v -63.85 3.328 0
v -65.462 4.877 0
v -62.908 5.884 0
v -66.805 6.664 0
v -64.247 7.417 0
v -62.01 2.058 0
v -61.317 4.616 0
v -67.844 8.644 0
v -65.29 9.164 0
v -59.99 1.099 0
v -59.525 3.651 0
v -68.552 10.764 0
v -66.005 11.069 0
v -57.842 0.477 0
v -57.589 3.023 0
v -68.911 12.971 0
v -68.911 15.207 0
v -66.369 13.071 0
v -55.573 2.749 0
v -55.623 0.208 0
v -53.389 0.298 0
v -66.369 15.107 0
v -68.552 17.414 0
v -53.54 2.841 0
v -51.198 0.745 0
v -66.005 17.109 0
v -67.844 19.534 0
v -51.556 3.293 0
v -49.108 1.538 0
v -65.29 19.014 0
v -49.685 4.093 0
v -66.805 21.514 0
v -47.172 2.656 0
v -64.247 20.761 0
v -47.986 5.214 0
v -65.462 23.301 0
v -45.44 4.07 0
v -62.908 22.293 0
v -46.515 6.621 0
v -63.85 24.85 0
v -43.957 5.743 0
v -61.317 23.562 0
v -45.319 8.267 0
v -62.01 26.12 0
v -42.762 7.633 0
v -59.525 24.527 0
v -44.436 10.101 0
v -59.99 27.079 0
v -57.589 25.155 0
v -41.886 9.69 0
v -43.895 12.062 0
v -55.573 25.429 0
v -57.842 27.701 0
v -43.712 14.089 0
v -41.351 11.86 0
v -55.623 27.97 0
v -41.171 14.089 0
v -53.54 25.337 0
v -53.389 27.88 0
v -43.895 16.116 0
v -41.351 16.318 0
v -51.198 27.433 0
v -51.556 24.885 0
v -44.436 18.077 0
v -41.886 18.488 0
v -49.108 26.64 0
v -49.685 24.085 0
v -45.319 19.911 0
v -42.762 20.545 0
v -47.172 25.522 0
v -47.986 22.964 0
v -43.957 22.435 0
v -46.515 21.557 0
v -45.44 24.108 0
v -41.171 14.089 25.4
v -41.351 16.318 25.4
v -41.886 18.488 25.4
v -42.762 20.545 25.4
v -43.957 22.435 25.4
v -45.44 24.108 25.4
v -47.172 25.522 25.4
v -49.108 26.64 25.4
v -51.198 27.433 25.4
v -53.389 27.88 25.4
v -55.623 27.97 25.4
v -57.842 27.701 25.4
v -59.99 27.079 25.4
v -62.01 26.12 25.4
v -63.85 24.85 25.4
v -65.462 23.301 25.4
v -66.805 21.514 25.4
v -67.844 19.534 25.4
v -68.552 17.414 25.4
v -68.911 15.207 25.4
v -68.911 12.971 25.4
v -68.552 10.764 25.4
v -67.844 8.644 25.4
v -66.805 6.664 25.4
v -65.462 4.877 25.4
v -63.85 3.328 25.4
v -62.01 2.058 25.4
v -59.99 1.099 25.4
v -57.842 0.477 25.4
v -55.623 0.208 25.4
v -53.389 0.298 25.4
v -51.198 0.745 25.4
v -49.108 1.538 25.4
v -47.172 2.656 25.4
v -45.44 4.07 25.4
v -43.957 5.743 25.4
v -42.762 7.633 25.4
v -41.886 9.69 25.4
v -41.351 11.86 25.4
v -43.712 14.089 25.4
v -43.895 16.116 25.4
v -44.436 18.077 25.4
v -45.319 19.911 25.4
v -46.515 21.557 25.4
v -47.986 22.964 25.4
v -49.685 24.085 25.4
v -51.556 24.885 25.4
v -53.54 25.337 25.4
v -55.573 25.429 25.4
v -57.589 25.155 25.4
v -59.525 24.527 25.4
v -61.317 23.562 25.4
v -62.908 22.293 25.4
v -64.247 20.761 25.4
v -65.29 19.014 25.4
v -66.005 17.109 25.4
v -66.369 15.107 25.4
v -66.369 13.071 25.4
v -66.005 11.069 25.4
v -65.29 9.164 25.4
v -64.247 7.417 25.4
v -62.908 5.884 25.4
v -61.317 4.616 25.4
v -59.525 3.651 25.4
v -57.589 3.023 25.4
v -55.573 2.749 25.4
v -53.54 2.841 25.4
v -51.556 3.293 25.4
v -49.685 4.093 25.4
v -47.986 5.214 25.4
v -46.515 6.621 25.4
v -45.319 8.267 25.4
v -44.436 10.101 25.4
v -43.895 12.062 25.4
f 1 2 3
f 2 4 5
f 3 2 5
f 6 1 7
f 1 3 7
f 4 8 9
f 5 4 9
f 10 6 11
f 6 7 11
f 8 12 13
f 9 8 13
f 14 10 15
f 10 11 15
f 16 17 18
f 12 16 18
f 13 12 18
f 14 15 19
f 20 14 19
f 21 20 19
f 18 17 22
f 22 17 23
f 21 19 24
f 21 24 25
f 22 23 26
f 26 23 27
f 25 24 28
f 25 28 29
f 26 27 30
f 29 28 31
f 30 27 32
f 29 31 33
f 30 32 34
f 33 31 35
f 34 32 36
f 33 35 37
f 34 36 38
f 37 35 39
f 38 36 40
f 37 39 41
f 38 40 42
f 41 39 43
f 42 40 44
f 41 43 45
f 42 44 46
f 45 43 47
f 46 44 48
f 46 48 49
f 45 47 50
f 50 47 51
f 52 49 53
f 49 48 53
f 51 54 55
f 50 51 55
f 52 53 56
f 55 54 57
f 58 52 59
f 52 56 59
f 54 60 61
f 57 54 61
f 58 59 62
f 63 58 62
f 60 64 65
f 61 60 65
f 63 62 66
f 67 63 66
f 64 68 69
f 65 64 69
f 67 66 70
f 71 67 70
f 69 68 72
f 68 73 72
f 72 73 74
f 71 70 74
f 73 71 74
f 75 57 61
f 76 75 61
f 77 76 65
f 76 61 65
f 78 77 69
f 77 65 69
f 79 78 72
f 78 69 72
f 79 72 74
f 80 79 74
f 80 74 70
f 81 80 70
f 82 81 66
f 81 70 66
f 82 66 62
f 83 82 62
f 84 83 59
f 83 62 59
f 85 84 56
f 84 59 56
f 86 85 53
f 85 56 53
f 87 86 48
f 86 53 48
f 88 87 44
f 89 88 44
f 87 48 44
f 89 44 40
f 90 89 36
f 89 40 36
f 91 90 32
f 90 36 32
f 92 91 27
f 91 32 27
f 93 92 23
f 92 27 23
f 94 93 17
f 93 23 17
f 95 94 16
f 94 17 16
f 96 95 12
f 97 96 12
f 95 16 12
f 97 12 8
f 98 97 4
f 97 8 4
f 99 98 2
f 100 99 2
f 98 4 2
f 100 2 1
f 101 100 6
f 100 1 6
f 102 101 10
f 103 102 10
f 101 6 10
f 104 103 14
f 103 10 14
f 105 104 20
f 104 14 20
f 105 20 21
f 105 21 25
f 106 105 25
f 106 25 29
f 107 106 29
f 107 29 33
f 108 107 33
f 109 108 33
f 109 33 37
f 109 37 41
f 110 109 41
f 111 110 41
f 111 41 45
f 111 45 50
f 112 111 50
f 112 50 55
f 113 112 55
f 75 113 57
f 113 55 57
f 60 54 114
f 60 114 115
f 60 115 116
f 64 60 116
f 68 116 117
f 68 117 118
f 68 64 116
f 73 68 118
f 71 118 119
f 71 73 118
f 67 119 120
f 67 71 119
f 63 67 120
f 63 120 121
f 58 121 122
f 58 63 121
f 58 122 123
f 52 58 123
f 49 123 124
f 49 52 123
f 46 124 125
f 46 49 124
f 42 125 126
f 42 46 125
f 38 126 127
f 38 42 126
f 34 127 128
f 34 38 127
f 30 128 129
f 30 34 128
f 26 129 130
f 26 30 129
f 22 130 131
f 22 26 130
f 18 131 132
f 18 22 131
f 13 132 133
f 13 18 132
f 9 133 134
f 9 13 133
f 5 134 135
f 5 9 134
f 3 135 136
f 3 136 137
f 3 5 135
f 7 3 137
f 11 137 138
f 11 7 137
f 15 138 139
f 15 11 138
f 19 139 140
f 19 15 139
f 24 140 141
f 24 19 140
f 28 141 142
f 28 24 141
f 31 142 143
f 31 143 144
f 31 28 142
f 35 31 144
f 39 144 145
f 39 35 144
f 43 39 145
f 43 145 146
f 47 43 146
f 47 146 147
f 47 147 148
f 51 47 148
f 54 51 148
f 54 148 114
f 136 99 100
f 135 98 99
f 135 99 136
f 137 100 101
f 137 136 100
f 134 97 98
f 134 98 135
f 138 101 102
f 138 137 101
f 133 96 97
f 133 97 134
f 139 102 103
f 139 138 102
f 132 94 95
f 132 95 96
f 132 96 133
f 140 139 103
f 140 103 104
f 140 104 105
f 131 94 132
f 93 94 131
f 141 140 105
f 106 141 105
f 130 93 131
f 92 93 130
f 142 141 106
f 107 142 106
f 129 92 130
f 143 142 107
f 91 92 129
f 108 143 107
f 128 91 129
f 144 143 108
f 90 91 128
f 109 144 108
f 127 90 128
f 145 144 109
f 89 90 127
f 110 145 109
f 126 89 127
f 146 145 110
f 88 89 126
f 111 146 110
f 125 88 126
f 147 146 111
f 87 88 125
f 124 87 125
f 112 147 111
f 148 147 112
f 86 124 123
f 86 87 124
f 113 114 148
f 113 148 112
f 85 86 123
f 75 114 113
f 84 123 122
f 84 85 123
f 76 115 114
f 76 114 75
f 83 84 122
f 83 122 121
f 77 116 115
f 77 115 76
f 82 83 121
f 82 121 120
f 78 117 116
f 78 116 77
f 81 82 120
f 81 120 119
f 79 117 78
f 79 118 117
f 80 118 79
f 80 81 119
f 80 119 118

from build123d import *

# Parameters (mm, degrees)
F3_R     = 11.3510766414
F4_DEPTH = 25.4
F0_R     = 13.8925555002
F0_R_2   = 11.3510766414
F5_R     = 11.3510766414
F6_DEPTH = 25.401


with BuildPart() as f4:
    # F3 (on face) → F4 (new body)
    with BuildSketch(Plane.XY):
        with Locations((-55.0634227693, 14.0889985487)):
            Circle(F3_R)
    extrude(amount=F4_DEPTH)

    # F5 (on face) → F6 (cut, through all)
    with BuildSketch(Plane.XY.offset(25.4)):
        with Locations((-55.0634227693, 14.0889985487)):
            Circle(F5_R)
    extrude(amount=-F6_DEPTH, mode=Mode.SUBTRACT)


with BuildPart() as f4b:
    # F0 (on Top) → F4, piece 2 (new body)
    with BuildSketch(Plane.XY):
        with Locations((-55.0634227693, 14.0889985487)):
            Circle(F0_R)
        with Locations((-55.0634227693, 14.0889985487)):
            Circle(F0_R_2, mode=Mode.SUBTRACT)
    extrude(amount=F4_DEPTH)


solid = f4b.part
